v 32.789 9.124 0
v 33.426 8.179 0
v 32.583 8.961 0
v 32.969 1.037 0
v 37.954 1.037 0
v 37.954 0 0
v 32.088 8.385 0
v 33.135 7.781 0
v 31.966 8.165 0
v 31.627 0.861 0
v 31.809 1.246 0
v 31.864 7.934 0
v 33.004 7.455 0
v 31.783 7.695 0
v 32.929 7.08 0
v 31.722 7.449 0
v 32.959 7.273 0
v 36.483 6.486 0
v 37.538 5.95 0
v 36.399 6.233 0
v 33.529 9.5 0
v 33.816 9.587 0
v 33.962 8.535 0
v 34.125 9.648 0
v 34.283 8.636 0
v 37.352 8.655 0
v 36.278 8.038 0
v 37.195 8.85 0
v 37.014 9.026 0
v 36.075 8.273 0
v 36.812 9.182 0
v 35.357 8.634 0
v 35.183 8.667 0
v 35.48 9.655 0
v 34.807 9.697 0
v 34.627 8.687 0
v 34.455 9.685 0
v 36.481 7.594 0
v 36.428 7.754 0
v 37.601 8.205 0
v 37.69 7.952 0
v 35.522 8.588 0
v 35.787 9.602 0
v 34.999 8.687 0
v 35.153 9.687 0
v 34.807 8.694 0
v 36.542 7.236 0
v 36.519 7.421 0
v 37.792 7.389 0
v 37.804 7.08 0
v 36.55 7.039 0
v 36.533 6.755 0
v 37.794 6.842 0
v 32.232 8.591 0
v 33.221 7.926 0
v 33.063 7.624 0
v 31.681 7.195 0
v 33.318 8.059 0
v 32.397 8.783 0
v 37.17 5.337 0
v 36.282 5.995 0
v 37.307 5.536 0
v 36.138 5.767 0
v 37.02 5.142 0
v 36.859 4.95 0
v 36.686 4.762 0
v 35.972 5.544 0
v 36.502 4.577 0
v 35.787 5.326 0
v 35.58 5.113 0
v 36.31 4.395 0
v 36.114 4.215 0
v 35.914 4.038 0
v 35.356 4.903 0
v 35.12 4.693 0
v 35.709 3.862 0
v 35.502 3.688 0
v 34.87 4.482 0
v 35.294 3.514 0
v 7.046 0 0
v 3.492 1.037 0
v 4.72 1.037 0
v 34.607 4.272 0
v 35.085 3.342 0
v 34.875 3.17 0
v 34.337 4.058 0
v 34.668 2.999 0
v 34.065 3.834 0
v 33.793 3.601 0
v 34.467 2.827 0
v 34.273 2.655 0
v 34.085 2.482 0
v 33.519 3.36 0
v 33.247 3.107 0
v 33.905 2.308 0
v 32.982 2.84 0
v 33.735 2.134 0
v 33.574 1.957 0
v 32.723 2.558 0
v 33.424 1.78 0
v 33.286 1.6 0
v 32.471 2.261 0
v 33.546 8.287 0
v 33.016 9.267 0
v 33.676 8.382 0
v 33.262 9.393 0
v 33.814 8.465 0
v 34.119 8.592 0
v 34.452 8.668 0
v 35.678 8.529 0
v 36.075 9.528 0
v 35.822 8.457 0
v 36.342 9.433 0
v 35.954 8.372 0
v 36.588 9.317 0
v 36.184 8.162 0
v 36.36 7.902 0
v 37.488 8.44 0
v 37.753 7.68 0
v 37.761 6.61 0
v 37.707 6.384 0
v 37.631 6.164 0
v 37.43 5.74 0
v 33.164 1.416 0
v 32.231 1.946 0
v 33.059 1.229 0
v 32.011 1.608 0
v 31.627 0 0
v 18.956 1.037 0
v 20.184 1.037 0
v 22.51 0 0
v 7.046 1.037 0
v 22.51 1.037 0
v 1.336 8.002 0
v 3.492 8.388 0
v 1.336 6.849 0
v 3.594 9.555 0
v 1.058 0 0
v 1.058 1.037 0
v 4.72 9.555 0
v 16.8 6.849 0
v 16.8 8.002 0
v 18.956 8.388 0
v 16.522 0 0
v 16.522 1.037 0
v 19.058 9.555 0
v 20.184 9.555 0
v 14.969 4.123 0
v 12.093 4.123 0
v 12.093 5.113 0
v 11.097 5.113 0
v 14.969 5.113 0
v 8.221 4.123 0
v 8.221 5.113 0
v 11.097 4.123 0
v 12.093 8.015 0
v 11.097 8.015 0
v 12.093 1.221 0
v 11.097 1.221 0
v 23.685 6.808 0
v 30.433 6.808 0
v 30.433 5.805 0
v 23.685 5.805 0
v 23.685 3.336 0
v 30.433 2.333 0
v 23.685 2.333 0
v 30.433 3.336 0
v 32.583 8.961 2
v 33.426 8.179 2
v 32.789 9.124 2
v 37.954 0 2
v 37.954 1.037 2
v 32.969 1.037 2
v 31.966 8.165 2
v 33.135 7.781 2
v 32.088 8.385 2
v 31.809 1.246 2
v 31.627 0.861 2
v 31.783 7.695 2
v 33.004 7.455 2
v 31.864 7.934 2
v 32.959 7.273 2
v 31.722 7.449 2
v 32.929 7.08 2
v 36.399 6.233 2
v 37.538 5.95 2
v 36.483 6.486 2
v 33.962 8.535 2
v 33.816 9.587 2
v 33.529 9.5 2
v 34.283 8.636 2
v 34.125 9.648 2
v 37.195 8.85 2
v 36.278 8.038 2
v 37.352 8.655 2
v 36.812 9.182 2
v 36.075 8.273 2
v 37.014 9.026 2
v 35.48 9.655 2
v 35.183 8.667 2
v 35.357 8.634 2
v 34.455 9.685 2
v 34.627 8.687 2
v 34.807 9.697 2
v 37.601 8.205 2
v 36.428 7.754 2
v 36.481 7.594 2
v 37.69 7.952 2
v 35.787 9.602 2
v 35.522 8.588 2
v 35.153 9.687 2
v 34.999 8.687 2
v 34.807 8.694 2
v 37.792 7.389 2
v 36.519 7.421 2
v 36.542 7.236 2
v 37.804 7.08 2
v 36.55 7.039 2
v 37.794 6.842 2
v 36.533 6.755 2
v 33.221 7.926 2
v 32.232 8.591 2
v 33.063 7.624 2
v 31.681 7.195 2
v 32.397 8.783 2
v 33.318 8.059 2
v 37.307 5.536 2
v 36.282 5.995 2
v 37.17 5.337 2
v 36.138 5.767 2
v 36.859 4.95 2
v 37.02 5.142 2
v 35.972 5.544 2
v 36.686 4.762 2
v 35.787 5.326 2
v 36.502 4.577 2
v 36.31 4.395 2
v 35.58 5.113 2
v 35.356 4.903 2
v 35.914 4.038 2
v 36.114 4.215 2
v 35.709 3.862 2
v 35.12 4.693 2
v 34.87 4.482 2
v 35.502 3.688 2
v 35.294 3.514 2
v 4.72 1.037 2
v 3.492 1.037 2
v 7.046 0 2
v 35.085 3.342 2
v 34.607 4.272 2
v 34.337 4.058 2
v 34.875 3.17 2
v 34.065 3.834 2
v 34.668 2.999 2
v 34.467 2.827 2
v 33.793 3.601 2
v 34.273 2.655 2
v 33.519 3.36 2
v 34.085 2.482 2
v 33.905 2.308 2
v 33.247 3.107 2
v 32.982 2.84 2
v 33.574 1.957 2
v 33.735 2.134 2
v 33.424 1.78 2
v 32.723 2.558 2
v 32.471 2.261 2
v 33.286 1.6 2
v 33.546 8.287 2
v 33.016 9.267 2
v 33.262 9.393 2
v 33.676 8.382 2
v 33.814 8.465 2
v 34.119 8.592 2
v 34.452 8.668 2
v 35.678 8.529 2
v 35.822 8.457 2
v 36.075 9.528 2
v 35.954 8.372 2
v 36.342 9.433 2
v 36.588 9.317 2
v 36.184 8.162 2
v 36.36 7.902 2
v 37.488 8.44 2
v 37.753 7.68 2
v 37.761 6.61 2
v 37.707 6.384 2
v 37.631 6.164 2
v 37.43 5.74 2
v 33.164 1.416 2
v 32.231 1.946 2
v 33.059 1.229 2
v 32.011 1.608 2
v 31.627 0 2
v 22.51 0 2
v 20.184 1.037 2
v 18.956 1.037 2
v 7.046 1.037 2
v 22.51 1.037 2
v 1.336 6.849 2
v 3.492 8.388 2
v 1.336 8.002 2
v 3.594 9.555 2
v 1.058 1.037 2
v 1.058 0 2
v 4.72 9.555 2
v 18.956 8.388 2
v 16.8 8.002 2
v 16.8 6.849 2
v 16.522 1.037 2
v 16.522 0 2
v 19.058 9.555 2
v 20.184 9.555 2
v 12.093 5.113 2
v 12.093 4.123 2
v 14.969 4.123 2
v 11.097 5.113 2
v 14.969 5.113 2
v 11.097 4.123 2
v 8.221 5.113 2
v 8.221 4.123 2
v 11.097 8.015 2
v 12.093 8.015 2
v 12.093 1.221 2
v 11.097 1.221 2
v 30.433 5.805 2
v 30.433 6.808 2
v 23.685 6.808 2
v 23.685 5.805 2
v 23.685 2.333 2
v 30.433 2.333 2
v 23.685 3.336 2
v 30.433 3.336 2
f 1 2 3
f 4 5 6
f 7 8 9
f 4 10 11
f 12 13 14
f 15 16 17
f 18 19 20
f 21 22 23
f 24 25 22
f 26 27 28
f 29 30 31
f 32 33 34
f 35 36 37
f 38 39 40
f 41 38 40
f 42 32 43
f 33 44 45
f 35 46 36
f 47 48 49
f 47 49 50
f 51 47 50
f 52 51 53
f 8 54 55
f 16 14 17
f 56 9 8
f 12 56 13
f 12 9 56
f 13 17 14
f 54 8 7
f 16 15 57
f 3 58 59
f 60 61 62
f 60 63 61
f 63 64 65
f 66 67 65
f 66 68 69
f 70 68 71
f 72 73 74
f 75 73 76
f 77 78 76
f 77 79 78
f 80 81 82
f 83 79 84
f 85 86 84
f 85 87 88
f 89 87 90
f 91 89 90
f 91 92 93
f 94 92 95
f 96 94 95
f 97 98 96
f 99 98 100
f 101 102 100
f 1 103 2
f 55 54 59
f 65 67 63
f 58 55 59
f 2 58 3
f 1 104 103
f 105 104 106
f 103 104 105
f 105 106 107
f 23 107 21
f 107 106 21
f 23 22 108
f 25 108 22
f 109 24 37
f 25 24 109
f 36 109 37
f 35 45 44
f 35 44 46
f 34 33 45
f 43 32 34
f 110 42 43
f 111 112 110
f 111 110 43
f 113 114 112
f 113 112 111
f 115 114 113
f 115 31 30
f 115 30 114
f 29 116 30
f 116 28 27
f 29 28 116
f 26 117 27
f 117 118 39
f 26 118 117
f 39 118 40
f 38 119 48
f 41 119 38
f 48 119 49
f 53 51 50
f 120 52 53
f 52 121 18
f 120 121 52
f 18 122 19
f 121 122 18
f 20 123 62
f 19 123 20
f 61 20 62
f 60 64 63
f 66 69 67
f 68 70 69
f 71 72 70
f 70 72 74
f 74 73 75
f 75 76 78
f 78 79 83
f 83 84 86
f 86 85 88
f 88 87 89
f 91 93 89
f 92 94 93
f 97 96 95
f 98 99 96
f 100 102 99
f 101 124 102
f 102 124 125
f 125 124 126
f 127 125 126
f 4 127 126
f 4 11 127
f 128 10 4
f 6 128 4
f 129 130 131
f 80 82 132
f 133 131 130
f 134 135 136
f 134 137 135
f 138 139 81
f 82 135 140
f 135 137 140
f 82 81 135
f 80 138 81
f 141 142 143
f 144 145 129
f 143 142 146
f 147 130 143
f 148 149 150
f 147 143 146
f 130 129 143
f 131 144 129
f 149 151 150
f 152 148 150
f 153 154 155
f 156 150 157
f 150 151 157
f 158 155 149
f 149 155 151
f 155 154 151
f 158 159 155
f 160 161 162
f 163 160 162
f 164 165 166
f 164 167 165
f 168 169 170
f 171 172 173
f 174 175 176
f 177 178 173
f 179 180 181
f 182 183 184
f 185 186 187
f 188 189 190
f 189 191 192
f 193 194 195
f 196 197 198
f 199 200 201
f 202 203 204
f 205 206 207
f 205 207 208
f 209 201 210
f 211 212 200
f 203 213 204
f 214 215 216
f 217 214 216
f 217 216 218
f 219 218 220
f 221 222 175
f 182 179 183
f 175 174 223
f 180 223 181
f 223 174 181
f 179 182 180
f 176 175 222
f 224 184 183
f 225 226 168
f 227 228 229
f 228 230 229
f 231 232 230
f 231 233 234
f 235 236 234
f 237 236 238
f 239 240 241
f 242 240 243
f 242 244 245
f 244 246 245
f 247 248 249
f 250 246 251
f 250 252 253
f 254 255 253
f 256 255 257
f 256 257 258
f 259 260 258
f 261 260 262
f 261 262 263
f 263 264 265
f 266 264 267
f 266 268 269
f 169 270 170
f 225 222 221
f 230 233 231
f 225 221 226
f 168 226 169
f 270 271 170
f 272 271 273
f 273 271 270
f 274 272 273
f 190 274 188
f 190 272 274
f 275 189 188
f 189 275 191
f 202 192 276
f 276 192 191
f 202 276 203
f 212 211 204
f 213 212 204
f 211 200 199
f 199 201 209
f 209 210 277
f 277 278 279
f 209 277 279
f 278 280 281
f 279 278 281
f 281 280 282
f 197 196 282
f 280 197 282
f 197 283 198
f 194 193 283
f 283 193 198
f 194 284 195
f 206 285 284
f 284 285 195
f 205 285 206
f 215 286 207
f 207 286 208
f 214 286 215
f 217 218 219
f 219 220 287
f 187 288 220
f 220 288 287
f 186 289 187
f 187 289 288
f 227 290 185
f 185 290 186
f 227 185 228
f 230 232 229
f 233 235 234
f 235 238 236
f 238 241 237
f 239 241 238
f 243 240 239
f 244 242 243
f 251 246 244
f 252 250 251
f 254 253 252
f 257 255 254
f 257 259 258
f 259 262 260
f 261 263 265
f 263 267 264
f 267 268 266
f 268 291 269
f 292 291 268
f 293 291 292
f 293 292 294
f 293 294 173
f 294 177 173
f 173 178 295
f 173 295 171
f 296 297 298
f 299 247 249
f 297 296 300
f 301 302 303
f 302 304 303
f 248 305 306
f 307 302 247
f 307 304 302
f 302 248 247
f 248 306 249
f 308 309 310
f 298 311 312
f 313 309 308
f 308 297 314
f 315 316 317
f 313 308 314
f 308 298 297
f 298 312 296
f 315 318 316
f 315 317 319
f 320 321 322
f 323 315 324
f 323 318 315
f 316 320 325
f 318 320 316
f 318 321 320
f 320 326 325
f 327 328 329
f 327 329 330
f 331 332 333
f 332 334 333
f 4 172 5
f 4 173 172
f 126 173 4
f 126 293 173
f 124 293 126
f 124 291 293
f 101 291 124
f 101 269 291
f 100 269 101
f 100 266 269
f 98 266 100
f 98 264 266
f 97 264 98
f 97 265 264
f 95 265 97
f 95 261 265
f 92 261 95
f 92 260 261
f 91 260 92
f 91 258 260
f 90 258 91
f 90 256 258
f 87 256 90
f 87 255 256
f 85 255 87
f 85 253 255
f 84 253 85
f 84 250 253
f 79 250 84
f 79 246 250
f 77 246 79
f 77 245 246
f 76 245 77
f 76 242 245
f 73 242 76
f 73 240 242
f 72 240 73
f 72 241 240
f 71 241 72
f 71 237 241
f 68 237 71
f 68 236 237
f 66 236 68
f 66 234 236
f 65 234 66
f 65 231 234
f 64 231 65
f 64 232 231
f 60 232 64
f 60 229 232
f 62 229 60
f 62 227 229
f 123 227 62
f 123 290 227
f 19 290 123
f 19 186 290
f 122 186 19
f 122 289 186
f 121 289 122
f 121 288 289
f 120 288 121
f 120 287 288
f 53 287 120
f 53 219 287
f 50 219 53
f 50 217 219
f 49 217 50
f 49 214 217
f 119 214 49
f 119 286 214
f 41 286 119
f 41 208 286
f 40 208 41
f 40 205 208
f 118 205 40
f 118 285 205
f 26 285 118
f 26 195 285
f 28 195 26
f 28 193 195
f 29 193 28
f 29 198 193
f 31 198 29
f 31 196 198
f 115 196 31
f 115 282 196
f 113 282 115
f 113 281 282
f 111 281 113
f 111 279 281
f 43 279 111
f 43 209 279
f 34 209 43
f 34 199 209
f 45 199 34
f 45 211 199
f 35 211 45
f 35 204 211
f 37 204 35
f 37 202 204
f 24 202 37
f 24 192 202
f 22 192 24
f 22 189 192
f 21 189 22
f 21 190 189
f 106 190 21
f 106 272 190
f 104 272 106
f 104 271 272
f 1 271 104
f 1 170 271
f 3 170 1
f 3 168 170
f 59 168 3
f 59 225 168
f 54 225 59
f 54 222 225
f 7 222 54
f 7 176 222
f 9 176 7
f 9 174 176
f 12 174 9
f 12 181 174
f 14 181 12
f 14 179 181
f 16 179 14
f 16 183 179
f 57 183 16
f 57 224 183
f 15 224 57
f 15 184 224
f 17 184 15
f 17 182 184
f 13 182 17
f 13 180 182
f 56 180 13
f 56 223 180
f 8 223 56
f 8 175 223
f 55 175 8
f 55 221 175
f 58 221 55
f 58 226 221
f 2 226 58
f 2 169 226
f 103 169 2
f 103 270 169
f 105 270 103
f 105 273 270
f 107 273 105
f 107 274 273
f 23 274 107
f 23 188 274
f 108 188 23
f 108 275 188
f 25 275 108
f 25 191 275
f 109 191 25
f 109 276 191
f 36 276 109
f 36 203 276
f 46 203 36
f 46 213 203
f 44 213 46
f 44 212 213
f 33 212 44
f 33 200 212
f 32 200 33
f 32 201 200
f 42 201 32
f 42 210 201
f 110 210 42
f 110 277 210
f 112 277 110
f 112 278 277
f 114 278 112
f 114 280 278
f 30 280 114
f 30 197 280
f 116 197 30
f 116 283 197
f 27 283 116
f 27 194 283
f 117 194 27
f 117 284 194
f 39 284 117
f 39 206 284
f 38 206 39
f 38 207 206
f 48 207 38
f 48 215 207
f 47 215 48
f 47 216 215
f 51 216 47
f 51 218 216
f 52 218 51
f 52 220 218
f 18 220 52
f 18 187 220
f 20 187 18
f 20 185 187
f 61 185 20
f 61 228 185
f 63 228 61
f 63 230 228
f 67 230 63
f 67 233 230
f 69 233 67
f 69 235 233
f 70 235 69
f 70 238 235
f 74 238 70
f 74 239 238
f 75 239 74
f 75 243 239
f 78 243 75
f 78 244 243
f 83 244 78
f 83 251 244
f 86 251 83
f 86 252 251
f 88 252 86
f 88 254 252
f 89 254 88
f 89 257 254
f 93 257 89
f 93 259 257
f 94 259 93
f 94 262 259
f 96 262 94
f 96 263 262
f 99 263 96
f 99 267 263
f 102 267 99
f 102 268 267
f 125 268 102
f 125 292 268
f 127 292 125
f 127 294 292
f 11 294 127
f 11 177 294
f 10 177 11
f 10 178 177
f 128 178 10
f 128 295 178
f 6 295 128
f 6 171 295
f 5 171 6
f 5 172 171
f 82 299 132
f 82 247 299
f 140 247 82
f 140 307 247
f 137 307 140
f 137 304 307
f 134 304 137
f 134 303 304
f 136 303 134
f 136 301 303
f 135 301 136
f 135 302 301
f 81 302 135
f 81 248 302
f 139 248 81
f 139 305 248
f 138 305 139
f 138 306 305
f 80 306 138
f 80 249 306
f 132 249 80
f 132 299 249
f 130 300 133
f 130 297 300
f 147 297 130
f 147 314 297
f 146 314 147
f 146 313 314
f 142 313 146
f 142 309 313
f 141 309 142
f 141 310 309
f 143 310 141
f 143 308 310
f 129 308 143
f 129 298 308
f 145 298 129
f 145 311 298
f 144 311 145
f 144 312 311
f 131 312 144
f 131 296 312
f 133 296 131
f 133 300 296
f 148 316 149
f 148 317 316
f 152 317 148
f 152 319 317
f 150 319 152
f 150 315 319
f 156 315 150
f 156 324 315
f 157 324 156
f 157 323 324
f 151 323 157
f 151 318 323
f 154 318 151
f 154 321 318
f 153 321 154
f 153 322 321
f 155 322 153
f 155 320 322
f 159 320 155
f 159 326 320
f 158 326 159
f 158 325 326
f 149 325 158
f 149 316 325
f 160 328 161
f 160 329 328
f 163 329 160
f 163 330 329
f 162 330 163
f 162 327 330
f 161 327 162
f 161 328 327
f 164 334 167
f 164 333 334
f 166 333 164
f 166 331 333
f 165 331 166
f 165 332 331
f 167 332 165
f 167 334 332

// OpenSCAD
expression = "1+1";

module end_of_parameters_dummy() {}

//use <eval.scad>;
function _isString(v) = v >= "";
function _isVector(v) = !(v>="") && len(v) != undef;
function _isFloat(v) = v+0 != undef;

function _substr(s, start=0, stop=undef, soFar = "") =
    start >= (stop==undef ? len(s) : stop) ? soFar :
        _substr(s, start=start+1, stop=stop, soFar=str(soFar, s[start]));

function _parseInt(s, start=0, stop=undef, accumulated=0) =
    let( stop = stop==undef ? len(s) : stop )
        start >= stop ? accumulated :
        s[start] == "+" ? _parseInt(s, start=start+1, stop=stop) :
        s[start] == "-" ? -_parseInt(s, start=start+1, stop=stop) :
        let (digit = search(s[start], "0123456789"))
            digit == [] ? 0 : _parseInt(s, start=start+1, stop=stop, accumulated=accumulated*10+digit[0]);

function _findNonDigit(s, start=0) =
    start >= len(s) || s[start]<"0" || s[start]>"9" ? start :
    _findNonDigit(s, start=start+1);

function _parseUnsignedFloat(s) =
    len(s) == 0 ? 0 :
        let(
            firstNonDigit = _findNonDigit(s),
            decimalPart = s[firstNonDigit]!="." ?
                [firstNonDigit,firstNonDigit] : [firstNonDigit+1, _findNonDigit(s, start=firstNonDigit+1)],
            intPart = _parseInt(s,start=0,stop=firstNonDigit),
            fractionPart = _parseInt(s,start=decimalPart[0],stop=decimalPart[1]),
            baseExp = s[decimalPart[1]]=="e" || s[decimalPart[1]]=="E" ? pow(10,_parseInt(s, start=decimalPart[1]+1)) : 1)
            (intPart+fractionPart*pow(10,-(decimalPart[1]-decimalPart[0])))*baseExp;

function _tail(v) = len(v)>=2 ? [for(i=[1:len(v)-1]) v[i]] : [];
function _isspace(c) = (" " == c || "\t" == c || "\r" == c || "\n" == c );
function _isdigit(c) = ("0" <= c && c <= "9" );
function _isalpha(c) = ("a" <= c && c <= "z") || ("A" <= c && c <= "Z");
function _isalpha_(c) = _isalpha(c)  || c=="_";
function _isalnum_(c) = _isalpha(c) || _isdigit(c) || c=="_";
function _flattenLists(ll) = [for(a=ll) for(b=a) b];

function _spaceSequence(s, start=0, count=0) =
    len(s)>start && _isspace(s[start]) ? _spaceSequence(s, start=start+1, count=count+1) : count;
function _digitSequence(s, start=0, count=0) =
    len(s)>start && _isdigit(s[start]) ? _digitSequence(s, start=start+1,count=count+1) : count;
function _alnum_Sequence(s, start=0, count=0) =
    len(s)>start && _isalnum_(s[start]) ? _alnum_Sequence(s, start=start+1,count=count+1) : count;
function _identifierSequence(s, start=0, count=0) =
    len(s)>start && _isalpha_(s[start]) ? _alnum_Sequence(s, start=start+1, count=count+1) : count;
function _signedDigitSequence(s, start=0) =
    len(s) <= start ? 0 :
        (s[start] == "+" || s[start] == "-" ) ? 1+_digitSequence(s,start=start+1) : _digitSequence(s,start=start);
function _realStartingWithDecimal(s, start=0) =
    len(s)>start && s[start] == "." ?
        let(next = start+1+_digitSequence(s, start=start+1))
        (s[next] == "e" || s[next] == "E" ?
            next-start+1+_signedDigitSequence(s, start=next+1) : next-start)
        : 0;
function _realContinuation(s, start=0) =
    len(s) <= start ? 0 :
        let(c1=_realStartingWithDecimal(s, start=start))
        c1 > 0 ? c1 :
        s[start] == "e" || s[start] == "E" ?
            1+_signedDigitSequence(s, start=start+1) : 0;
function _positiveRealSequence(s, start=0) =
    len(s) <= start ? 0 :
        let(c1 = _realStartingWithDecimal(s, start=start))
            c1 > 0 ? c1 :
        let(c2 = _digitSequence(s, start=start))
            c2 > 0 ? c2 + _realContinuation(s, start=start+c2) : 0;

_multiSymbolOperators = [ "<=", ">=", "==", "&&", "||" ]; // must be in order of decreasing length

function _multiSymbolOperatorSequence(s, start=0) =
    (s[start]=="<" && s[start+1]=="=") ||
    (s[start]==">" && s[start+1]=="=") ||
    (s[start]=="=" && s[start+1]=="=") ||
    (s[start]=="!" && s[start+1]=="=") ||
    (s[start]=="&" && s[start+1]=="&") ||
    (s[start]=="|" && s[start+1]=="|") ? 2 : 0;

function _tokenize(s, start=0) =
    start >= len(s) ? [] :
    let(c1=_spaceSequence(s, start=start)) c1>0 ?
        concat([" "], _tokenize(s, start=start+c1)) :
    let(c2=_identifierSequence(s, start=start)) c2>0 ?
        concat([_substr(s, start=start, stop=start+c2)], _tokenize(s, start=start+c2)) :
    let(c3=_positiveRealSequence(s, start=start)) c3>0 ?
        concat([_substr(s, start=start, stop=start+c3)], _tokenize(s, start=start+c3)) :
    let(c4=_multiSymbolOperatorSequence(s, start=start)) c4>0 ?
        concat([_substr(s, start=start, stop=start+c4)], _tokenize(s, start=start+c4)) :
        concat([s[start]], _tokenize(s, start=start+1));


function _endParens(list,start=0,openCount=0,stop=undef) =
    let(stop = stop==undef ? len(list) : stop)
    start >= stop ? (openCount?undef:stop) :
    list[start][0] == ")" ?
            (openCount==1 ? start+1 : _endParens(list,start+1,stop=stop, openCount=openCount-1)) :
    _endParens(list,start+1,stop=stop, openCount=
        list[start][0] == "(" ?
            openCount+1 : openCount);

function _indexInTable(string, table, column=0) =
    let (s=search([string], table, index_col_num=column))
        s[0] == [] ? -1 : s[0][0];

_NAME = 0;
_ARITY = 1;
_PREC = 2;
_ASSOC_DIR = 3;
_ARGUMENTS_FROM_VECTOR = 4;
_OPERATOR = 5;
_EXTRA_DATA = 6;

function _func(op) = [ op, 1, -1, 1, true, op ];

_operators = [
    [ "[", 1, -1, 1, true, "[" ],
    [ "pow", 1, -1, 1, true, "^" ],
    [ "cross", 1, -1, 1, true, "cross" ],
    _func("sqrt"),
    _func("cos"),
    _func("sin"),
    _func("tan"),
    _func("acos"),
    _func("asin"),
    _func("atan"),
    _func("COS"),
    _func("SIN"),
    _func("TAN"),
    _func("ACOS"),
    _func("ASIN"),
    _func("ATAN"),
    _func("abs"),
    _func("ceil"),
    _func("exp"),
    _func("floor"),
    _func("ln"),
    _func("log"),
    _func("round"),
    _func("sign"),
    _func("norm"),
    [ "atan2", 1, -1, 1, true, "atan2" ],
    [ "ATAN2", 1, -1, 1, true, "ATAN2" ],
    [ "max", 1, -1, 1, true, "max" ],
    [ "min", 1, -1, 1, true, "min" ],
    [ "concat", 1, -1, 1, true, "concat" ],
    [ "#", 2, 0, -1, false, "#" ],
    [ "^", 2, 0, -1, false, "^" ],
    [ "#-",1, 0.5, 0, true, "-" ],
    [ "#+",1, 0.5, 0, true, "+" ],
    [ "*", 2, 1, 1, false, "*" ],
    [ "/", 2, 1, 1, false, "/" ],
    [ "%", 2, 1, 1, false, "%" ],
    [ "+", 2, 2, 1, true, "+" ],
    [ "-", 2, 2, 1, true, "-" ],
    [ "!=", 2, 3, 1, true, "!=" ],
    [ "==", 2, 3, 1, true, "==" ],
    [ "<=", 2, 3, 1, true, "<=" ],
    [ ">=", 2, 3, 1, true, ">=" ],
    [ "<", 2, 3, 1, true, "<" ],
    [ ">", 2, 3, 1, true, ">" ],
    [ "!", 1, 4, 1, true, "!" ],
    [ "&&", 2, 5, 1, true, "&&" ],
    [ "||", 2, 5, 1, true, "||" ],
    [ "?", 2, 10, -1, true, "?" ],
    [ ":", 2, 10, -1, true, ":" ],
    [ "=", 2, 30, 1, true, "=" ], // for let()
    [ "let", 1, 25, 1, true, "let" ],
    [ ",", 2, 100, 1, true, "," ]
   ];

_binary_or_unary = [ ["-", "#-"], ["+", "#+"], ["#", "["] ];

// insert parentheses in some places to tweak the order of
// operations in those contexts
function _fixBrackets(pretok,start=0) =
    start >= len(pretok) ? [] :
    pretok[start] == "[" ?
        concat(["#", "("], _fixBrackets(pretok,start=start+1)) :
    pretok[start] == "]" ?
        concat([")"], _fixBrackets(pretok,start=start+1)) :
    pretok[start] == "?" ?
        concat([pretok[start],"("], _fixBrackets(pretok,start=start+1)) :
    pretok[start] == ":" ?
        concat([")",pretok[start]], _fixBrackets(pretok,start=start+1)) :
        concat(pretok[start], _fixBrackets(pretok,start=start+1));

// disambiguate operators that can be unary or binary
function _fixUnaries(pretok) =
    [ for (i=[0:len(pretok)-1])
         let (
            a = pretok[i],
            j=_indexInTable(a, _binary_or_unary))
            (0 <= j && (i == 0 || pretok[i-1] == "(" ||
                0 <= _indexInTable(pretok[i-1], _operators)))? _binary_or_unary[j][1] : a ];

function _fixLet1(tok, start=0, stop=undef) =
    let (stop = stop==undef ? len(tok) : stop)
        start >= stop ? [] :
        tok[start][0] == "let"?
           let(endP=_endParens(tok,start=start+1,stop=stop,openCount=0)) concat([concat(tok[start], [_fixLet1(tok,start=start+2,stop=endP-1)])], _fixLet1(tok,start=endP,stop=stop)) :
        concat([tok[start]], _fixLet1(tok,start=start+1,stop=stop));

function _parsePass1(s) =
    let (pretok=_fixUnaries(_fixBrackets(_tokenize(s))))
    _fixLet1(
    [ for (i=[0:len(pretok)-1])
        let (a=pretok[i])
        if (a[0] != " ")
            let (j=_indexInTable(a, _operators))
                j >= 0 ? _operators[j] : [a] ] );

function _prec(op1, pos1, op2, pos2) =
    op1 != undef && op2 == undef ? false :
    op1 == undef && op2 != undef ? true :
    op1 == undef && op2 == undef ? true :
    op1[_ARITY] == 1 && pos1 > pos2 ? true :
    op2[_ARITY] == 1 && pos2 > pos1 ? false :
    op1[_PREC] < op2[_PREC] ? true :
        op2[_PREC] < op1[_PREC] ? false :
            op1[_ASSOC_DIR] * pos1 < op2[_ASSOC_DIR] * pos2;

function _parseLiteralOrVariable(s) =
        s == "PI" ? PI :
        s == "true" ? true :
        s == "false" ? false :
        s == "undef" ? undef :
        _isalpha_(s[0]) ? s :
        _parseUnsignedFloat(s);

function _isoperator(token) = _PREC<len(token);

function _getCandidatesForMainOperator(tok,start,stop) =
   start >= stop ? [] :
   tok[start][0] == "(" ?
        _getCandidatesForMainOperator(tok,_endParens(tok,start=start+1,stop=stop,openCount=1),stop)
        :
        _isoperator(tok[start]) ? concat([[tok[start],start]],_getCandidatesForMainOperator(tok,start+1,stop)) :
        _getCandidatesForMainOperator(tok,start+1,stop);

// Find the operator with least precedence
function _findMainOperatorPos(candidates,start=0) =
    len(candidates) <= start ? undef :
    let(rest=_findMainOperatorPos(candidates,start+1))
    _prec(candidates[rest][0], rest, candidates[start][0], start) ? start : rest;

function _firstOccurrence(c,opName,start=0) =
    start >= len(c) ? undef :
    c[start][0][0] == opName ? c[start] :
        _firstOccurrence(c,opName,start=start+1);

// We know the main operator is a ? or a :. We now need to find out which.
function _mainQuestionOperator(c) =
    let(fq = _firstOccurrence(c,"?"),
        fc = _firstOccurrence(c,":"))
        fq[1] != undef && (fc[1] == undef || fq[1] < fc[1]) ? fq : fc;

function _mainOperator(tok,start,stop) =
    let(c=_getCandidatesForMainOperator(tok,start,stop),
        pos=_findMainOperatorPos(c),
        m=c[pos])
        m[0][0] == "?" ?
            concat(m, [_firstOccurrence(c,":",start=pos+1)[1]])
            : m;

function _doLets(assignments, final, start=0) =
    start >= len(assignments) ? final :
    assignments[start][0] == "=" ? ["let", ["'", assignments[start][1]], assignments[start][2], _doLets(assignments, final, start=start+1)] : _doLets(assignments, final, start=start+1);

function _letOperator(a,b) =
    let(rawAssignments=_fixCommas(a),
        assignments=rawAssignments[0] == "[[" ?
            _tail(rawAssignments) : [a])
    _doLets(assignments, b);

/* This takes a fully tokenized vector, each element of which is either a line from the _operators table or a vector containing a single non-operator string, and parses it using general parenthesis and operator parsing. Comma expressions for building vectors will be parsed in the next pass. */
function _parseMain(tok,start=0,stop=undef) =
    let( stop= stop==undef ? len(tok) : stop )
        stop <= start ? undef :
        tok[start][0] == "(" && _endParens(tok,start=start+1,stop=stop,openCount=1)==stop ?
            _parseMain(tok,start=start+1,stop=stop-1) :
        let( lp = _mainOperator(tok,start,stop) )
            lp[0] == undef ? ( stop-start>1 ? undef : _parseLiteralOrVariable(tok[start][0]) ) :
            let( op = lp[0], pos = lp[1] )
                op[_NAME] == "?" ?
                    [ op[_OPERATOR], _parseMain(tok,start=start,stop=pos), _parseMain(tok,start=pos+1,stop=lp[2]), _parseMain(tok,start=lp[2]+1,stop=stop) ] :
                op[_NAME] == "let" ?
                    _letOperator( _parseMain(op[_EXTRA_DATA]), _parseMain(tok,start=pos+1,stop=stop)) :
                op[_ARITY] == 2 ?
                    [ op[_OPERATOR], _parseMain(tok,start=start,stop=pos), _parseMain(tok,start=pos+1,stop=stop) ]
                    : [ op[_OPERATOR], _parseMain(tok,start=pos+1,stop=stop) ];


// this upgrades sequences of binary commas to vectors
function _fixCommas(expression) =
    expression[0] == "," ?
        let(a=_fixCommas(expression[1]),
            b=_fixCommas(expression[2]))
            a[0] == "[[" ?
                concat(["[["],concat(_tail(a), [b])) :
                ["[[",a,b]
        :
    _isVector(expression) ?
            concat([expression[0]], [for (i=[1:len(expression)-1]) _fixCommas(expression[i])]) :
            expression;

// fix arguments from vectors
function _fixArguments(expression) =
    let(i=_indexInTable(expression[0], _operators, _OPERATOR))
            i >=0 && _operators[i][_ARGUMENTS_FROM_VECTOR] && expression[1][0] == "[[" ? concat([expression[0]], [for (i=[1:len(expression[1])-1]) _fixArguments(expression[1][i])]) :
/*            expression[0] == "?" ?
                concat([expression[0],expression[1]],[for (i=[1:len(expression[2])-1]) _fixArguments(expression[2][i])]) : */
            len(expression)>1 && !_isString(expression) ?
                concat([expression[0]], [for (i=[1:len(expression)-1]) _fixArguments(expression[i])])
                    : expression;

function _optimizedLiteral(x) =
    len(x)==undef ? x : ["'", x];

function _wellDefined(x) =
    x==undef ? false :
    len(x)==undef ? true :
    x[0] == "'" ? true :
    len(x)==1 ? x[0]!=undef :
    len([for (a=x) if(!_wellDefined(a)) true])==0;

function _optimize(expression) =
    let(x=eval(expression,$careful=true))
        _wellDefined(x) ? _optimizedLiteral(x) :
        expression[0] == "'" ? _optimizedLiteral(x) :
        ! _isString(expression) ?
            concat([expression[0]], [for(i=[1:len(expression)-1]) _optimize(expression[i])]) :
        expression;

function compileFunction(expression,optimize=true) =
            _isVector(expression) ? expression :
            _isFloat(expression) ? expression :
            let(unoptimized = _fixArguments(_fixCommas(_parseMain(_parsePass1(expression)))))
        optimize ? _optimize(unoptimized) : unoptimized;

function evaluateFunction(expression,variables) = eval(compileFunction(expression,optimize=false),variables);

function _let(v, var, value) = concat([var, value], v);

function _lookupVariable(var, table) =
    let (s=search([var], table, index_col_num=0))
        s[0] == [] ? undef : table[s[0][0]][1];

function _generate(var, range, expr, v) =
    [ for(i=range) eval(expr, _let(v, var, i)) ];

function _safeNorm(v) =
    ! _isVector(v) || len([for (x=v) x+0==undef]) ? undef : norm(v);

function eval(c,v=[]) =
    ""<=c ? _lookupVariable(c,v) :
    let(op=c[0]) (
    op == undef ? c :
    op == "'" ? c[1] :
    op == "+" ? (len(c)==2 ? eval(c[1],v) : eval(c[1],v)+eval(c[2],v)) :
    op == "-" ? (len(c)==2 ? -eval(c[1],v) : eval(c[1],v)-eval(c[2],v)) :
    op == "*" ? eval(c[1],v)*eval(c[2],v) :
    op == "/" ? eval(c[1],v)/eval(c[2],v) :
    op == "%" ? eval(c[1],v)%eval(c[2],v) :
    op == "sqrt" ? sqrt(eval(c[1],v)) :
    op == "^" || op == "pow" ? pow(eval(c[1],v),eval(c[2],v)) :
    op == "cos" ? cos(eval(c[1],v)) :
    op == "sin" ? sin(eval(c[1],v)) :
    op == "tan" ? tan(eval(c[1],v)) :
    op == "acos" ? acos(eval(c[1],v)) :
    op == "asin" ? asin(eval(c[1],v)) :
    op == "atan" ? atan(eval(c[1],v)) :
    op == "atan2" ? atan2(eval(c[1],v),eval(c[2],v)) :
    op == "COS" ? cos(eval(c[1],v)*180/PI) :
    op == "SIN" ? sin(eval(c[1],v)*180/PI) :
    op == "TAN" ? tan(eval(c[1],v)*180/PI) :
    op == "ACOS" ? acos(eval(c[1],v))*PI/180 :
    op == "ASIN" ? asin(eval(c[1],v))*PI/180 :
    op == "ATAN" ? atan(eval(c[1],v))*PI/180 :
    op == "ATAN2" ? atan2(eval(c[1],v),eval(c[2],v))*PI/180 :
    op == "abs" ? abs(eval(c[1],v)) :
    op == "ceil" ? ceil(eval(c[1],v)) :
    op == "cross" ? cross(eval(c[1],v),eval(c[2],v)) :
    op == "exp" ? exp(eval(c[1],v)) :
    op == "floor" ? floor(eval(c[1],v)) :
    op == "ln" ? ln(eval(c[1],v)) :
    op == "len" ? len(eval(c[1],v)) :
    op == "log" ? log(eval(c[1],v)) :
    op == "max" ? (len(c) == 2 ? max(eval(c[1],v)) : max([for(i=[1:len(c)-1]) eval(c[i],v)])) :
    op == "min" ? (len(c) == 2 ? min(eval(c[1],v)) : min([for(i=[1:len(c)-1]) eval(c[i],v)])) :
    op == "norm" ?
        (!$careful ? norm(eval(c[1],v)) : _safeNorm(eval(c[1],v))) :
    op == "rands" ? rands(eval(c[1],v),eval(c[2],v),eval(c[3],v),eval(c[4],v)) :
    op == "round" ? round(eval(c[1],v)) :
    op == "sign" ? sign(eval(c[1],v)) :
    op == "[" ? [for (i=[1:len(c)-1]) eval(c[i],v)] :
    op == "#" ? eval(c[1],v)[eval(c[2],v)] :
    op == "<" ? eval(c[1],v)<eval(c[2],v) :
    op == "<=" ? eval(c[1],v)<=eval(c[2],v) :
    op == ">=" ? eval(c[1],v)>=eval(c[2],v) :
    op == ">" ? eval(c[1],v)>=eval(c[2],v) :
    op == "==" ? (!$careful ? eval(c[1],v)==eval(c[2],v) :
        (let(c1=eval(c[1],v))
        c1==undef ? undef :
        let(c2=eval(c[2],v))
        c2==undef ? undef :
        c1 == c2) ) :
    op == "!=" ? (!$careful ? eval(c[1],v)!=eval(c[2],v) :
        (let(c1=eval(c[1],v))
        c1==undef ? undef :
        let(c2=eval(c[2],v))
        c2==undef ? undef :
        c1 != c2) ) :
    op == "&&" ? (!$careful ? eval(c[1],v)&&eval(c[2],v) :
        (let(c1=eval(c[1],v))
        c1==undef ? undef :
        !c1 ? false :
        let(c2=eval(c[2],v))
        c2==undef ? undef :
        c1 && c2) ) :
    op == "||" ? (!$careful ? eval(c[1],v)||eval(c[2],v) :
        (let(c1=eval(c[1],v))
        c1==undef ? undef :
        c1 ? true :
        let(c2=eval(c[2],v))
        c2==undef ? undef :
        c1 || c2) ) :
    op == "!" ? (!$careful ? !eval(c[1],v) :
        (let(c1=eval(c[1],v))
        c1==undef ? undef :
        !c1) ) :
    op == "?" ? (!$careful ? (eval(c[1],v)?eval(c[2],v):eval(c[3],v)) :
        (let(c1=eval(c[1],v))
        c1==undef ? undef :
        c1 ? eval(c[2],v):eval(c[3],v)) ):

    op == "concat" ? [for (i=[1:len(c)-1]) let(vect=eval(c[i],v)) for(j=[0:len(vect)-1]) vect[j]] :
    op == "range" ? (len(c)==3 ? [eval(c[1],v):eval(c[2],v)] : [eval(c[1],v):eval(c[2],v):eval(c[3],v)]) :
    op == "let" ? (!$careful ? eval(c[3],concat([[eval(c[1],v),eval(c[2],v)]], v)) :
            let(c1=eval(c[1],v),c2=eval(c[2],v))
                c1==undef || c2==undef ? undef :
                    eval(c[3],concat([[c1,c2]], v)) ) :
    op == "gen" ? _generate(eval(c[1],v),eval(c[2],v),c[3],v) :
    undef
    );

// per 10,000 operations with "x^3*y-x*y^3"
// 24 sec compile
// 21 sec unoptimized compile
// 22 sec evaluateFunction()
// 0.7 sec eval

// pass1 10 seconds [tokenize: 4 seconds]
// parseMain 6
// fixCommas 0
// fixArguments 3
// optimize 3
/*
echo(compileFunction("x^(2*3)"));
fc = compileFunction("x^3*y-x*y^3",optimize=true);
echo(fc);
echo(eval(fc,[["x",1],["y",1]]));
z=[for(i=[0:9999]) compileFunction("x^3*y-x*y^3",optimize=false)];//fc,[ ["x",1],["y",2] ])];
*/

//z = [for(i=[1:10000]) compileFunction("x^3*y-x*y^3")];
// normal: 23

//function repeat(s, copies, soFar="") = copies <= 0 ? soFar : repeat(s, copies-1, soFar=str(soFar,s));


linear_extrude(height=2)
text(str(expression,"=",evaluateFunction(expression)));
